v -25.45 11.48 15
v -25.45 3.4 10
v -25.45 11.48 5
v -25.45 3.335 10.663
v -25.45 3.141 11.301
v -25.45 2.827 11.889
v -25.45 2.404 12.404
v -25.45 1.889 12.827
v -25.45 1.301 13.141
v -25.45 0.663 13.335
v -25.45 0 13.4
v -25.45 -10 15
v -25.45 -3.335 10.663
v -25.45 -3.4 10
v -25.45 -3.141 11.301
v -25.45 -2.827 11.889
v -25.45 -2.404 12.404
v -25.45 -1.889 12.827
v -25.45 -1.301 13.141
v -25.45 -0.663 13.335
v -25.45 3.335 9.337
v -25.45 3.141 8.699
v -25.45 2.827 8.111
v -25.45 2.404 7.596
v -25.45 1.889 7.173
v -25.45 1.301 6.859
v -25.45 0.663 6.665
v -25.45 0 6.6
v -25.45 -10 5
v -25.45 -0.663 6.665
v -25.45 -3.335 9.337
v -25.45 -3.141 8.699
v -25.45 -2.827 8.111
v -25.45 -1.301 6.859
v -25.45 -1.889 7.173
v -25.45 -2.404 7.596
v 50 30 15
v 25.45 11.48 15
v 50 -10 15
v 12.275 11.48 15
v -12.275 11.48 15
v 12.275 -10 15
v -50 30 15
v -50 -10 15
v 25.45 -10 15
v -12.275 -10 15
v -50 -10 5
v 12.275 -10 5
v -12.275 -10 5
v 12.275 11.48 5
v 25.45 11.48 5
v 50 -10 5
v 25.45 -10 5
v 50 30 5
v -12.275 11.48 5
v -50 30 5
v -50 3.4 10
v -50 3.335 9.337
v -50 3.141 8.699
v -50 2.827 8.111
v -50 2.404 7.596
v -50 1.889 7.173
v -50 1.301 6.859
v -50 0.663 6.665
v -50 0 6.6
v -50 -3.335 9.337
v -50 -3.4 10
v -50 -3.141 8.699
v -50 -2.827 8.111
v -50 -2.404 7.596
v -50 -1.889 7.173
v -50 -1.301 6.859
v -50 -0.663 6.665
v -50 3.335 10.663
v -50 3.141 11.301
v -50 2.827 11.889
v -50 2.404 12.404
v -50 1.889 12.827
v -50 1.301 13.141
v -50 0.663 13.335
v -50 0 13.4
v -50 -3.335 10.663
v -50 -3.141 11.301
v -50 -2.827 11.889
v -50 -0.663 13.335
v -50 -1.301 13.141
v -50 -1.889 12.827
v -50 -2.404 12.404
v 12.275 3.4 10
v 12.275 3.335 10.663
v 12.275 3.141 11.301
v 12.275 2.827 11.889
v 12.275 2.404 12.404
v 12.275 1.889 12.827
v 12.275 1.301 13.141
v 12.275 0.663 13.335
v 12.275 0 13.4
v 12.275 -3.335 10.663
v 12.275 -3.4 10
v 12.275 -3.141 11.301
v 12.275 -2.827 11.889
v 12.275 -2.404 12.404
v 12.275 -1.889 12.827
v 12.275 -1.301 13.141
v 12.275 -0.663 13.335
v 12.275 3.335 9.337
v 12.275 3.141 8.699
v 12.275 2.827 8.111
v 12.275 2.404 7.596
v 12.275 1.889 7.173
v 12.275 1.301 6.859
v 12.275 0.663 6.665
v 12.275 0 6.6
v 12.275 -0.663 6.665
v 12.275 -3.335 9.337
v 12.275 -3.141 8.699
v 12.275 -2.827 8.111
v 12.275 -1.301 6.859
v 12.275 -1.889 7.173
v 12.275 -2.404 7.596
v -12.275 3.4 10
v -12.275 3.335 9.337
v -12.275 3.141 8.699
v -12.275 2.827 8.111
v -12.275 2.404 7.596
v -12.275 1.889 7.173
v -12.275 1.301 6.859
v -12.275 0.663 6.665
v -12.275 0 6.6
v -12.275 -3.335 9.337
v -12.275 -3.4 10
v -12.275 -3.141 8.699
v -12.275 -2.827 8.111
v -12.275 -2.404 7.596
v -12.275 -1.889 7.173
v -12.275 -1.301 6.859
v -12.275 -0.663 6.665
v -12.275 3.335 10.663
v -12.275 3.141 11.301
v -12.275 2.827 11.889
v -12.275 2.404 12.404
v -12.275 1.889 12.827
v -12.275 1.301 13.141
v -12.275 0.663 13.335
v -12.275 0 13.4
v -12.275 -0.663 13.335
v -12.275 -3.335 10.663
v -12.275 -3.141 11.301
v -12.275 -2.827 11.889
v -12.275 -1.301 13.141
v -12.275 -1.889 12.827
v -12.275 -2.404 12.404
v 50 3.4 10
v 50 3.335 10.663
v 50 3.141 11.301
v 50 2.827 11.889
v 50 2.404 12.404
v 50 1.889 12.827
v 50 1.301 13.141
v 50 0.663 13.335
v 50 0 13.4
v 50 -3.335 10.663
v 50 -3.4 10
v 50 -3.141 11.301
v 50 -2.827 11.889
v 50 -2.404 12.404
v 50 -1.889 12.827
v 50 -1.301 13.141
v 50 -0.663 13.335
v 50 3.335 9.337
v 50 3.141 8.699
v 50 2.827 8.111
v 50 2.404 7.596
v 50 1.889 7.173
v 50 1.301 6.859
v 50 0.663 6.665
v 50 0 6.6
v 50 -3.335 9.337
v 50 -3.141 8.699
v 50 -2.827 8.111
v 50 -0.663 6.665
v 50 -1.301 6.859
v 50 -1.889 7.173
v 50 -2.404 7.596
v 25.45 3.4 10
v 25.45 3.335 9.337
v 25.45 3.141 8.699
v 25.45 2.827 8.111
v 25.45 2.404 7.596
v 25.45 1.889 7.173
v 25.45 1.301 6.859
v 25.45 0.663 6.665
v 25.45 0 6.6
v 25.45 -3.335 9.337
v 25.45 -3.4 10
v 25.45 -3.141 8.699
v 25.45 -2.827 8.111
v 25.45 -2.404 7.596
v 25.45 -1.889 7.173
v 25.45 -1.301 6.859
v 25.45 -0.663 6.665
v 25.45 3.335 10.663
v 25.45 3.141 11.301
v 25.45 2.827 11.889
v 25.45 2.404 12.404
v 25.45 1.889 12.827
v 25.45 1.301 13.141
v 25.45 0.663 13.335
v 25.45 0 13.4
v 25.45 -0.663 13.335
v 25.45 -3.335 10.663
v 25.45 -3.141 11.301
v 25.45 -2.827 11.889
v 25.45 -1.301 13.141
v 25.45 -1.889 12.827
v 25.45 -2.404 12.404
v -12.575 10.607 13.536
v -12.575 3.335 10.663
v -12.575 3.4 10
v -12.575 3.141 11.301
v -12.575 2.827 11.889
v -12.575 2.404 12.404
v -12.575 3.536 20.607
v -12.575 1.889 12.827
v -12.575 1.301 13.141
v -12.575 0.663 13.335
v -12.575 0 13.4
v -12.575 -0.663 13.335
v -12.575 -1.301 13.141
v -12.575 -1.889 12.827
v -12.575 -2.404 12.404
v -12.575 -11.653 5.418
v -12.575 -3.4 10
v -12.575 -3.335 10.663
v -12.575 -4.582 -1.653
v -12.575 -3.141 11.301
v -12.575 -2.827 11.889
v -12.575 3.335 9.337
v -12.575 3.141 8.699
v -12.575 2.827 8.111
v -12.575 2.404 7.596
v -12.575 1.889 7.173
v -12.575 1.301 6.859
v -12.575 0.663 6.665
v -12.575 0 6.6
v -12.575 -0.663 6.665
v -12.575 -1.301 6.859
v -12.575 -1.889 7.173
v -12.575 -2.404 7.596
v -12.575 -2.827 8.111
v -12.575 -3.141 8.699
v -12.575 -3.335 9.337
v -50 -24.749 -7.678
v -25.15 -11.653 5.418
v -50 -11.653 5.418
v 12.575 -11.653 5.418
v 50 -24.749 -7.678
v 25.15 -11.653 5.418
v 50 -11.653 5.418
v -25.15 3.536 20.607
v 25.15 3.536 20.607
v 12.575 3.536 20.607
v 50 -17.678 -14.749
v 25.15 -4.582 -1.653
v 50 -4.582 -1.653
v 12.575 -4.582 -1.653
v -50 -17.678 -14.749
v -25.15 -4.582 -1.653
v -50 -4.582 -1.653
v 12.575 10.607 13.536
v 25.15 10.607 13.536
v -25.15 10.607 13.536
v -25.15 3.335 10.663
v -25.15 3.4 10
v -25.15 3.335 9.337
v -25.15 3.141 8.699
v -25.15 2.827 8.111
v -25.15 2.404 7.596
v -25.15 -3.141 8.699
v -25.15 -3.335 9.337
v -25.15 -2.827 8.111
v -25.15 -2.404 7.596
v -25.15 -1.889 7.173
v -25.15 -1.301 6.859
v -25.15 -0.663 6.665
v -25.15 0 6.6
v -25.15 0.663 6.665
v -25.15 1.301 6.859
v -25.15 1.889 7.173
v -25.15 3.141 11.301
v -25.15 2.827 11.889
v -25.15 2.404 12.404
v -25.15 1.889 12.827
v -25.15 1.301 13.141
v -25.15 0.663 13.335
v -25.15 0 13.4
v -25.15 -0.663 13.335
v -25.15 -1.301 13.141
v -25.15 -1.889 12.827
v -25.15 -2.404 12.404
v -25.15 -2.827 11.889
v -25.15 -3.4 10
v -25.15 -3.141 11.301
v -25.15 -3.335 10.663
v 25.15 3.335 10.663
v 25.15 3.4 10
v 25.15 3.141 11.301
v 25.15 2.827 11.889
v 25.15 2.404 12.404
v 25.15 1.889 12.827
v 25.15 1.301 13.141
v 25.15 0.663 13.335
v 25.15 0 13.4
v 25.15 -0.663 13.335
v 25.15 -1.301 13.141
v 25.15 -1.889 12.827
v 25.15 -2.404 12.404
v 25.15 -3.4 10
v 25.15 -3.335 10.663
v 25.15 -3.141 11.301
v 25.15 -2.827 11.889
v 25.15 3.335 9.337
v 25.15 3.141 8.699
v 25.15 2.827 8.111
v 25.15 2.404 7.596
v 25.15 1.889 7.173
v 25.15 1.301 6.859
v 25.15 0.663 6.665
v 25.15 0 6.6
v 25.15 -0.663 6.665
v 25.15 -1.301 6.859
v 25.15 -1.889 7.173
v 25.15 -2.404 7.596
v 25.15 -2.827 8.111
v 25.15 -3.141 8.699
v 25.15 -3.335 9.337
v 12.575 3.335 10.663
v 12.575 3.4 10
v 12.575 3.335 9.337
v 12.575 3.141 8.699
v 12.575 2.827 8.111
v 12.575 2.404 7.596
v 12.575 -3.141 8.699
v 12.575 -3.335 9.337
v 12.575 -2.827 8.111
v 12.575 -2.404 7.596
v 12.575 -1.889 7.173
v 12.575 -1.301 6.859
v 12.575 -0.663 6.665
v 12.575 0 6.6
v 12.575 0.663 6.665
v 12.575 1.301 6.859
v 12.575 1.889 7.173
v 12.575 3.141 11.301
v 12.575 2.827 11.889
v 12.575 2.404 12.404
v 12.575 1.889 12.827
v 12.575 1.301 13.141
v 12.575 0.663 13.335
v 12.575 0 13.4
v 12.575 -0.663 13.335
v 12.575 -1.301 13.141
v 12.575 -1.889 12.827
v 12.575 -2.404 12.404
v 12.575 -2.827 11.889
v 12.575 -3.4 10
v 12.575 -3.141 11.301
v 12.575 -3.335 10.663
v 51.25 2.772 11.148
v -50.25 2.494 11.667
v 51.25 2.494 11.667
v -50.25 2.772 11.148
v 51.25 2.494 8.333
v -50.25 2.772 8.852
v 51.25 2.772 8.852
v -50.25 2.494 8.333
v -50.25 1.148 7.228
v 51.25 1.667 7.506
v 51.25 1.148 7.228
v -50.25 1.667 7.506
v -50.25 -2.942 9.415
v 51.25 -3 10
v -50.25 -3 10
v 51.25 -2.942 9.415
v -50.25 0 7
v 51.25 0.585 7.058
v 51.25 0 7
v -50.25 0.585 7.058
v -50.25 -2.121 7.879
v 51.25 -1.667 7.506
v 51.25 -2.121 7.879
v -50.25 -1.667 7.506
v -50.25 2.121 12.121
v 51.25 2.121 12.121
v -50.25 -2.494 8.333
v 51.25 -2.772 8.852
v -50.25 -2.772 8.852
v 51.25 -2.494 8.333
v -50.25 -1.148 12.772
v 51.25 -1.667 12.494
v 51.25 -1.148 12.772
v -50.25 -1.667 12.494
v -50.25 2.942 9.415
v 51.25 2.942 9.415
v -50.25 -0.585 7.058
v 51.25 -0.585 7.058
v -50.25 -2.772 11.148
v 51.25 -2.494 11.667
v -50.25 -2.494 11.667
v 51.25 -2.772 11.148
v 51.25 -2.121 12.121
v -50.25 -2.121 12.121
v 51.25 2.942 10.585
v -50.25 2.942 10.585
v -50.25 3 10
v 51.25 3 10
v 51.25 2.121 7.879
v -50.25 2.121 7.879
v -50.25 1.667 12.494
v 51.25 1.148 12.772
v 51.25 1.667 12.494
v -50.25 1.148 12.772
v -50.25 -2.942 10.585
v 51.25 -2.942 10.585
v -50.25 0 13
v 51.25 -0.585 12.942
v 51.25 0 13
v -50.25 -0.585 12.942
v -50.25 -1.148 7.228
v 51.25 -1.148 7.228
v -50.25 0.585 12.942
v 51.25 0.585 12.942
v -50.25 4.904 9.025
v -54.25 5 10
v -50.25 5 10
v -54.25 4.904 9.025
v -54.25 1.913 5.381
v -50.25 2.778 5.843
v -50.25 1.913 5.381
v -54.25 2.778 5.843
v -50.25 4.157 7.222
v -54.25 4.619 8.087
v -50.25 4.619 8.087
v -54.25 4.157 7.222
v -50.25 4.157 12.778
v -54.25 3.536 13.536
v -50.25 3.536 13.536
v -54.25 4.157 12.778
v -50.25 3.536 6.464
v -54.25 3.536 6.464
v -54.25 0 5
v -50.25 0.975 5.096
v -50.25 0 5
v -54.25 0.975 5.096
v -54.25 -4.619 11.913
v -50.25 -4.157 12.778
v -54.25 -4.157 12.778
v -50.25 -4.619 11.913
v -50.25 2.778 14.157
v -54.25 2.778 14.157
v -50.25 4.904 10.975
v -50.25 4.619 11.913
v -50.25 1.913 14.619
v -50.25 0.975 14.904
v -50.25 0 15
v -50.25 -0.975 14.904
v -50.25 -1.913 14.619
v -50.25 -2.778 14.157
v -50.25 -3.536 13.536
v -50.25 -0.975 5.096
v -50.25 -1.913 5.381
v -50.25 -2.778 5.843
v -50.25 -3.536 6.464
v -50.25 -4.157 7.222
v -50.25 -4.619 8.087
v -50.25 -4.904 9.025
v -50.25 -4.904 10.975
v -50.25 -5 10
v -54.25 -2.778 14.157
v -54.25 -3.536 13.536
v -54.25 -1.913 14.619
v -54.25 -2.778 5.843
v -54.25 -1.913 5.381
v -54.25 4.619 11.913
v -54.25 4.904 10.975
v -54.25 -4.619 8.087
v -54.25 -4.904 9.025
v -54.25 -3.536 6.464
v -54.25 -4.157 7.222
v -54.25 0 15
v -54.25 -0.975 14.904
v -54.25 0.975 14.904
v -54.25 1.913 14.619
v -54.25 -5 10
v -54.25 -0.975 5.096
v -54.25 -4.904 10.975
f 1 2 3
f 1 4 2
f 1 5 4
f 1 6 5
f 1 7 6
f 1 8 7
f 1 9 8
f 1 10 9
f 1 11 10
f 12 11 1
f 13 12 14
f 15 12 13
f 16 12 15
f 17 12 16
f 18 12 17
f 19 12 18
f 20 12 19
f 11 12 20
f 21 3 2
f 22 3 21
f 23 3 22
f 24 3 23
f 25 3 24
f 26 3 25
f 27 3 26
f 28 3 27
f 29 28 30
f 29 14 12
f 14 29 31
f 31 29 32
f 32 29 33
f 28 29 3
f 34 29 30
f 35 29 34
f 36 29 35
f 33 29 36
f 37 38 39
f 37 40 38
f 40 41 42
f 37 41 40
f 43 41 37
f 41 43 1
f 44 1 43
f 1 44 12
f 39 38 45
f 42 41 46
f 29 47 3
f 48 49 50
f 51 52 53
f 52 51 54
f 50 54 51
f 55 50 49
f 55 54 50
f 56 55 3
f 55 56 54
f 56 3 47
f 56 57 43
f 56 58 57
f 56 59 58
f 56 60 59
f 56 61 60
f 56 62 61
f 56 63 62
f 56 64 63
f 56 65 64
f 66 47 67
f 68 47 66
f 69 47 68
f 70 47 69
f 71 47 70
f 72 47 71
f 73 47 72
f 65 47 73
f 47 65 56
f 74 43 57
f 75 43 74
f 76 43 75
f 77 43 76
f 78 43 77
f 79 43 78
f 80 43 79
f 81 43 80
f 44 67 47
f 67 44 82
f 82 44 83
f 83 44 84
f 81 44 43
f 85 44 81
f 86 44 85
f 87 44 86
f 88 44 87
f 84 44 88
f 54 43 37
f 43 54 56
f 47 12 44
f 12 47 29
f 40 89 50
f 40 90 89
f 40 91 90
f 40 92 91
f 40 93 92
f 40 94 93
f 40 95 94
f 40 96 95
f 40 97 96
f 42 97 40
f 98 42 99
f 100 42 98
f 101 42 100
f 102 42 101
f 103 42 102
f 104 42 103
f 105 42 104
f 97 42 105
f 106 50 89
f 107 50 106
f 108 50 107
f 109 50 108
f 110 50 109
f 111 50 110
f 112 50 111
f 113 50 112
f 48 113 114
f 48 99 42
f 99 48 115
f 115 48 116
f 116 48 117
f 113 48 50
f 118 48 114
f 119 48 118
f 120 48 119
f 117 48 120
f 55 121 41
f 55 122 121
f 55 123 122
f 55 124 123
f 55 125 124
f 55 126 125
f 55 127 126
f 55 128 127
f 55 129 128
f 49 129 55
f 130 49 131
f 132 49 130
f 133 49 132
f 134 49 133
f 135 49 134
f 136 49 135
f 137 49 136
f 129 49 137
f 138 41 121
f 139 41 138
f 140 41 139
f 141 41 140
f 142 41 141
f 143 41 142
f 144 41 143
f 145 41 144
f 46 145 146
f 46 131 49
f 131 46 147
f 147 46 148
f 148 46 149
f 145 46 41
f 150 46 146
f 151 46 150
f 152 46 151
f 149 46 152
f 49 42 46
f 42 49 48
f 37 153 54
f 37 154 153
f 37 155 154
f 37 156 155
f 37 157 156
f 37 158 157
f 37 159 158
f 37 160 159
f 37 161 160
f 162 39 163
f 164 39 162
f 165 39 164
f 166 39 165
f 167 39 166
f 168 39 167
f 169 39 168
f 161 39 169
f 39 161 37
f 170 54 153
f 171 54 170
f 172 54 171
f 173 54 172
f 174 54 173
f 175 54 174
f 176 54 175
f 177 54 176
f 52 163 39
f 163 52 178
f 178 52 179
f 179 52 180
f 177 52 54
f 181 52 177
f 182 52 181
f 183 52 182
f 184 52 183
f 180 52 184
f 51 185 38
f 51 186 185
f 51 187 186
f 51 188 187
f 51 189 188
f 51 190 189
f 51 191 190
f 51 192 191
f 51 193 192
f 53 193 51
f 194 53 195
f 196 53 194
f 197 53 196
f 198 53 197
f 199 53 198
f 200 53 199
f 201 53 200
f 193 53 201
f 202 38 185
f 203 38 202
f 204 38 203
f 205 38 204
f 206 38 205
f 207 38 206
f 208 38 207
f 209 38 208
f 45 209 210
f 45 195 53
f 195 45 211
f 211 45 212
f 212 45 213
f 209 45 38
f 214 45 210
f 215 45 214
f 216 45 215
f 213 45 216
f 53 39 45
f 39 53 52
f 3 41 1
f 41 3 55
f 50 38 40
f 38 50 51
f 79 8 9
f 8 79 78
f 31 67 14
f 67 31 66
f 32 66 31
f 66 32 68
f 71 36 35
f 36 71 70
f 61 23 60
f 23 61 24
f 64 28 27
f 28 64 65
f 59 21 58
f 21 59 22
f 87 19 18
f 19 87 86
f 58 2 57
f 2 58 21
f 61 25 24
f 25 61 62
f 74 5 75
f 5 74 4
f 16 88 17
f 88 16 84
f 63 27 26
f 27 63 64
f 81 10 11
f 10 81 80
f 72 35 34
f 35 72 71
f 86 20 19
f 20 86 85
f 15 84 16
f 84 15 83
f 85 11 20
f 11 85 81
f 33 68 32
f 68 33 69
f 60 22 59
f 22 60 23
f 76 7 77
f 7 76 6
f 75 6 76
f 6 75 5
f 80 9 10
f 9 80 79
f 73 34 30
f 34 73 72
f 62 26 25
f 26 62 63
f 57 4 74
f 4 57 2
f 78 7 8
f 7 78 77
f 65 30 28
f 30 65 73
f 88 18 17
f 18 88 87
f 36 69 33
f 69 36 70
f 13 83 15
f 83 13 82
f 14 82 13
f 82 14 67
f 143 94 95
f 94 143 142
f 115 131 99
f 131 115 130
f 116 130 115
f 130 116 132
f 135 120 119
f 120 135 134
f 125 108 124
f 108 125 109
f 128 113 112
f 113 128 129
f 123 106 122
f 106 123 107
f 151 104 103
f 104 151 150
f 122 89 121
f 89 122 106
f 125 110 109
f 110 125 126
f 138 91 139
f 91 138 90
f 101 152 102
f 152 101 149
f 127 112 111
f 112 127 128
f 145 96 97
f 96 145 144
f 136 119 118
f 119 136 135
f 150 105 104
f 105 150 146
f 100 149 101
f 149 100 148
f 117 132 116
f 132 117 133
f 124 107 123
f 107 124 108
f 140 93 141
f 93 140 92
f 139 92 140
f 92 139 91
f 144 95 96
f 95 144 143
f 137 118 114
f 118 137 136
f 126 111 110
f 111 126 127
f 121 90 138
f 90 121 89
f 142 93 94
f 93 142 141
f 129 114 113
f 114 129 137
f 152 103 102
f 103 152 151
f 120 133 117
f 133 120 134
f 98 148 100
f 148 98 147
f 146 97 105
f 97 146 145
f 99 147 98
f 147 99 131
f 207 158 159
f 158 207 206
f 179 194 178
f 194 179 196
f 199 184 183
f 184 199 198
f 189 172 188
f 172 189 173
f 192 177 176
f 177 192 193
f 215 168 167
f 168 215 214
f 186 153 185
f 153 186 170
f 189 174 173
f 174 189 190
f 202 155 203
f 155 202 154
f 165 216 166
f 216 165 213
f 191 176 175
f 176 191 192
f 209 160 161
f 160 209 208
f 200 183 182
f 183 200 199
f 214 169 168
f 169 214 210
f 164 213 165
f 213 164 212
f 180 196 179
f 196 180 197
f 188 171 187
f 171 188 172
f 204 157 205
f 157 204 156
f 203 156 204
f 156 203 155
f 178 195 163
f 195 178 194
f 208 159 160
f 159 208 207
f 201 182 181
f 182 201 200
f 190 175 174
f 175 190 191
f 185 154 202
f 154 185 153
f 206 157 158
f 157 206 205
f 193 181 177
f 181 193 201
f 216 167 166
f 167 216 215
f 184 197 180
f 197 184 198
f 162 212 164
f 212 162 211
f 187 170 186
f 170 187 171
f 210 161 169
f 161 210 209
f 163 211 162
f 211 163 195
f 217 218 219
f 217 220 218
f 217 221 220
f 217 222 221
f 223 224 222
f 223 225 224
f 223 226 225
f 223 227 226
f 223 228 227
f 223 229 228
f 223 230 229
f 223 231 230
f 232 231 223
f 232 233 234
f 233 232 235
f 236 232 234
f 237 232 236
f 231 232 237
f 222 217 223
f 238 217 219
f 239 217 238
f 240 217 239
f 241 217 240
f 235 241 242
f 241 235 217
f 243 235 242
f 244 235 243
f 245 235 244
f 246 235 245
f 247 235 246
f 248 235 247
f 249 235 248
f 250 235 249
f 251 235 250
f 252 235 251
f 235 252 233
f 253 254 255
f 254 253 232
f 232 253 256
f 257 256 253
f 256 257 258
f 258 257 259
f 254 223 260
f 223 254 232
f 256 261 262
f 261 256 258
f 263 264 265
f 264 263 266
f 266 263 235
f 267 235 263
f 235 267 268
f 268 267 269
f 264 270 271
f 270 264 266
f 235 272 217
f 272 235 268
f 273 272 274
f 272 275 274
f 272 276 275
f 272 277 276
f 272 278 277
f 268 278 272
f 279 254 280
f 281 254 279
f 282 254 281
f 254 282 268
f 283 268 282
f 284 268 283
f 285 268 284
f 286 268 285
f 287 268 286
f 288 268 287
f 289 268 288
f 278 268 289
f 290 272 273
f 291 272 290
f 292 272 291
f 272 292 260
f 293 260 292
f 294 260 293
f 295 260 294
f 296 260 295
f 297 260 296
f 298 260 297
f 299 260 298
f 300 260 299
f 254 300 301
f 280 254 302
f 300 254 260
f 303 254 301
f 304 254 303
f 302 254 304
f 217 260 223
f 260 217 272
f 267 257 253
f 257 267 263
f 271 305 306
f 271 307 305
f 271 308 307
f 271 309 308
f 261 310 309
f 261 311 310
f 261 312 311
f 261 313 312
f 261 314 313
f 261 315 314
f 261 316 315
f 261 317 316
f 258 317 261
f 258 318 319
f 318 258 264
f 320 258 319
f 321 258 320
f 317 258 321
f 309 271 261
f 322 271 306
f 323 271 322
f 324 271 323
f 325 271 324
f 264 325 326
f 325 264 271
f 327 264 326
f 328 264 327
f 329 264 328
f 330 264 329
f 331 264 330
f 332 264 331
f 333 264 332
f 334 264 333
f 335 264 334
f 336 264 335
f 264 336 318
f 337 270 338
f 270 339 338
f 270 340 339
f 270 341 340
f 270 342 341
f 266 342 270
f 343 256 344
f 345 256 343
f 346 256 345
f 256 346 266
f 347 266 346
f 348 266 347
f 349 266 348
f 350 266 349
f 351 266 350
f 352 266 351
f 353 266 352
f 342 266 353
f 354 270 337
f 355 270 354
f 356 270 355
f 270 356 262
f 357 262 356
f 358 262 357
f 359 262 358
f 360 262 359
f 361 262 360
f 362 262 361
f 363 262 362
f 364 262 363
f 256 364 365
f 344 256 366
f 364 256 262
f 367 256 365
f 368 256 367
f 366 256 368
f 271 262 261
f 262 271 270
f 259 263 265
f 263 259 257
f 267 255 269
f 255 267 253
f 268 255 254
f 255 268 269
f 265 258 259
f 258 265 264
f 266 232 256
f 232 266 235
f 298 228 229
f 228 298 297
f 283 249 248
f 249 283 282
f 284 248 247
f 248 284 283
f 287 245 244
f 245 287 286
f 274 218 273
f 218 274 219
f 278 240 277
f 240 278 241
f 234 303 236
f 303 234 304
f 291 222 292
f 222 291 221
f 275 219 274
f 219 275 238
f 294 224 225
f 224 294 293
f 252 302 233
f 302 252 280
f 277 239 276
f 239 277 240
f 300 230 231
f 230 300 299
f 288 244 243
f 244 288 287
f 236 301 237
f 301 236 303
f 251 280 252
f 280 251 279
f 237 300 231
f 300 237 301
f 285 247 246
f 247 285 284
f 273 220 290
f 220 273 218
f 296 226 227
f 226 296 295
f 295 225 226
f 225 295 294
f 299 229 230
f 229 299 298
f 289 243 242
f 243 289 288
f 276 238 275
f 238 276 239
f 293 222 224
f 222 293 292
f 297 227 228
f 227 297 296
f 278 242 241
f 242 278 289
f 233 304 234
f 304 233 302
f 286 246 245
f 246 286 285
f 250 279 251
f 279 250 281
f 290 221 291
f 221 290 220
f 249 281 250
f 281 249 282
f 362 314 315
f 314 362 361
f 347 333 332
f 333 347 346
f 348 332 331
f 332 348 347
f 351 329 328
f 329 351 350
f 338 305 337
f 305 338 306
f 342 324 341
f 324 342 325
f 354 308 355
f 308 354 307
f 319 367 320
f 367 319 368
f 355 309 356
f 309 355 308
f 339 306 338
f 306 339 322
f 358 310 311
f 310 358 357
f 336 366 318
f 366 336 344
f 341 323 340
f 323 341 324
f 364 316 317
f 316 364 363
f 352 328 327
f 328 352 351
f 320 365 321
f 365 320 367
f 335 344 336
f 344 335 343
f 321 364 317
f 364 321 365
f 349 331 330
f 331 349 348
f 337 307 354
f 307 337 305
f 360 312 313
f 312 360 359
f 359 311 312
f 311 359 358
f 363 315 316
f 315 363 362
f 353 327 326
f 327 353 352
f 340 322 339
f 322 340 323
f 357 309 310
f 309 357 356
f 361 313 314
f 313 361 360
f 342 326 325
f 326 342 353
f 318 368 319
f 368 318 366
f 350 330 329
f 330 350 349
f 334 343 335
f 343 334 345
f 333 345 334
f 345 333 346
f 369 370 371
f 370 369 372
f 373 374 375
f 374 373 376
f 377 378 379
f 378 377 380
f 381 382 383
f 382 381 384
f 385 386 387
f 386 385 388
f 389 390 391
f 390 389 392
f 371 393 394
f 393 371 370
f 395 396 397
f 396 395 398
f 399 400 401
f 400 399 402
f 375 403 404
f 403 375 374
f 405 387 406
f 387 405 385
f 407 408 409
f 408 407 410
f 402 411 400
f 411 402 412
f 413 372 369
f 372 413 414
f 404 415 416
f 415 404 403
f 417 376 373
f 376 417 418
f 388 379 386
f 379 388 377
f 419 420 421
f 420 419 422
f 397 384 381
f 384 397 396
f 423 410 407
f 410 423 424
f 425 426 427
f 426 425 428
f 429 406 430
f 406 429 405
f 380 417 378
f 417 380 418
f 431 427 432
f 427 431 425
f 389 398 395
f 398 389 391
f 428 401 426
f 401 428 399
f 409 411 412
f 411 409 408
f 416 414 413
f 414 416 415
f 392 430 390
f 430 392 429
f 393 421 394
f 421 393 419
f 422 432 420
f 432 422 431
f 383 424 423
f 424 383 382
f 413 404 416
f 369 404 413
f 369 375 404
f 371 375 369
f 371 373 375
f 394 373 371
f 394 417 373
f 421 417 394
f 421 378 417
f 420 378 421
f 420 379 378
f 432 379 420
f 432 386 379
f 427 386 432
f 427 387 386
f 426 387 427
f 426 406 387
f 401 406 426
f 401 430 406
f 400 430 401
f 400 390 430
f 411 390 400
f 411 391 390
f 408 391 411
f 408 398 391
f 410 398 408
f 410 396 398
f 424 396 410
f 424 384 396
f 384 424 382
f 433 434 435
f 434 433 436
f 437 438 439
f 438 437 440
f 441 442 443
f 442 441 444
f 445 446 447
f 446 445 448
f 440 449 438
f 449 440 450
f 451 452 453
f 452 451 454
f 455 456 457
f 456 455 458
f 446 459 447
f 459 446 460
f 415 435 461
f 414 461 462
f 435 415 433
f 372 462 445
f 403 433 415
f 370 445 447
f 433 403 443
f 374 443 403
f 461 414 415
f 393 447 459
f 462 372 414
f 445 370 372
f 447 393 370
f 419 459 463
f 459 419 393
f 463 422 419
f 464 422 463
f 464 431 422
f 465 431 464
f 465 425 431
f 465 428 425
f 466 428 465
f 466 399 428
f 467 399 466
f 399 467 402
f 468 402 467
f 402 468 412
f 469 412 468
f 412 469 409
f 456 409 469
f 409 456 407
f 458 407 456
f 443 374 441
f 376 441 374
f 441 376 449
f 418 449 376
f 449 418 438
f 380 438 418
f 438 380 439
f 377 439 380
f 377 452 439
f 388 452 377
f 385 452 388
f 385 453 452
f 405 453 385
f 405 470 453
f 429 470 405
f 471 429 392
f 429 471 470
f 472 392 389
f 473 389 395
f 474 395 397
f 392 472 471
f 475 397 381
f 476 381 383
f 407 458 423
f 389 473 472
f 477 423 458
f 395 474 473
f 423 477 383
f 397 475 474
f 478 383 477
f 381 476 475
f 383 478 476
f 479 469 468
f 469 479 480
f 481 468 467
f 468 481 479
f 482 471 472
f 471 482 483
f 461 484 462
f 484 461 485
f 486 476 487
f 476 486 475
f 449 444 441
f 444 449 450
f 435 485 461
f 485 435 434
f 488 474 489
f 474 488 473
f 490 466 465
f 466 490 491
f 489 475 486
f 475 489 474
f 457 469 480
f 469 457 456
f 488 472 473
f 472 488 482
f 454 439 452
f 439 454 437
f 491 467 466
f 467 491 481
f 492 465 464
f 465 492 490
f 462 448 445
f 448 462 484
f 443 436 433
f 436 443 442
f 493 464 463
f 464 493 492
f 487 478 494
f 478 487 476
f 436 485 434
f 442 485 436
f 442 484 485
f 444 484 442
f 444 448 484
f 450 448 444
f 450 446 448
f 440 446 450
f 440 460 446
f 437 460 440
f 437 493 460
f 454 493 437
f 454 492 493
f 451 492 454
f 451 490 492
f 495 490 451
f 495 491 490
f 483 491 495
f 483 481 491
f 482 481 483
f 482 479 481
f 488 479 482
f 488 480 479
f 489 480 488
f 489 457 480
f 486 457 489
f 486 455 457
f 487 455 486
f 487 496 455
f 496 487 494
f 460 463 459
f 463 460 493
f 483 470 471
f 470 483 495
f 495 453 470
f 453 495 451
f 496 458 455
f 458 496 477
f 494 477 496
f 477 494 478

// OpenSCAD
$fn = 32;

// ------------------------------------------------------------------------
// Butt hinge: hinge 100 mm, leaf swung 45 deg
// Every part is its own module, assembly() places every instance.
// ------------------------------------------------------------------------

// --- part 1 ---
module hinge_base() {
  difference() {
    union() {
      translate([-50, -10, -5]) cube([24.55, 40, 10]);
      translate([-12.275, -10, -5]) cube([24.55, 40, 10]);
      translate([25.45, -10, -5]) cube([24.55, 40, 10]);
      translate([-50, 11.48, -5]) cube([100, 18.52, 10]);
    }
    translate([-37.725, 0, 0]) rotate([0, 90, 0]) cylinder(h = 26.55, d = 6.8, center = true);
    translate([0, 0, 0]) rotate([0, 90, 0]) cylinder(h = 26.55, d = 6.8, center = true);
    translate([37.725, 0, 0]) rotate([0, 90, 0]) cylinder(h = 26.55, d = 6.8, center = true);
  }
}

// --- part 2 ---
module hinge_mover() {
  difference() {
    union() {
      translate([-25.15, -30, -5]) cube([12.575, 40, 10]);
      translate([12.575, -30, -5]) cube([12.575, 40, 10]);
      translate([-50, -30, -5]) cube([100, 18.52, 10]);
    }
    translate([-18.863, 0, 0]) rotate([0, 90, 0]) cylinder(h = 14.575, d = 6.8, center = true);
    translate([18.863, 0, 0]) rotate([0, 90, 0]) cylinder(h = 14.575, d = 6.8, center = true);
  }
}

// --- part 3 ---
module hinge_pin() {
  rotate([0, 90, 0]) cylinder(h = 102.5, d = 6, center = true);
  translate([-54.25, 0, 0]) rotate([0, 90, 0]) cylinder(h = 4, d = 10);
}

// --- assembly ---
module assembly() {
  color([0.80, 0.24, 0.20]) translate([0, 0, 10]) rotate([0, 0, 0]) hinge_base();
  color([0.20, 0.45, 0.75]) translate([0, 0, 10]) rotate([45, 0, 0]) hinge_mover();
  color([0.25, 0.62, 0.32]) translate([0, 0, 10]) rotate([0, 0, 0]) hinge_pin();
}

assembly();
